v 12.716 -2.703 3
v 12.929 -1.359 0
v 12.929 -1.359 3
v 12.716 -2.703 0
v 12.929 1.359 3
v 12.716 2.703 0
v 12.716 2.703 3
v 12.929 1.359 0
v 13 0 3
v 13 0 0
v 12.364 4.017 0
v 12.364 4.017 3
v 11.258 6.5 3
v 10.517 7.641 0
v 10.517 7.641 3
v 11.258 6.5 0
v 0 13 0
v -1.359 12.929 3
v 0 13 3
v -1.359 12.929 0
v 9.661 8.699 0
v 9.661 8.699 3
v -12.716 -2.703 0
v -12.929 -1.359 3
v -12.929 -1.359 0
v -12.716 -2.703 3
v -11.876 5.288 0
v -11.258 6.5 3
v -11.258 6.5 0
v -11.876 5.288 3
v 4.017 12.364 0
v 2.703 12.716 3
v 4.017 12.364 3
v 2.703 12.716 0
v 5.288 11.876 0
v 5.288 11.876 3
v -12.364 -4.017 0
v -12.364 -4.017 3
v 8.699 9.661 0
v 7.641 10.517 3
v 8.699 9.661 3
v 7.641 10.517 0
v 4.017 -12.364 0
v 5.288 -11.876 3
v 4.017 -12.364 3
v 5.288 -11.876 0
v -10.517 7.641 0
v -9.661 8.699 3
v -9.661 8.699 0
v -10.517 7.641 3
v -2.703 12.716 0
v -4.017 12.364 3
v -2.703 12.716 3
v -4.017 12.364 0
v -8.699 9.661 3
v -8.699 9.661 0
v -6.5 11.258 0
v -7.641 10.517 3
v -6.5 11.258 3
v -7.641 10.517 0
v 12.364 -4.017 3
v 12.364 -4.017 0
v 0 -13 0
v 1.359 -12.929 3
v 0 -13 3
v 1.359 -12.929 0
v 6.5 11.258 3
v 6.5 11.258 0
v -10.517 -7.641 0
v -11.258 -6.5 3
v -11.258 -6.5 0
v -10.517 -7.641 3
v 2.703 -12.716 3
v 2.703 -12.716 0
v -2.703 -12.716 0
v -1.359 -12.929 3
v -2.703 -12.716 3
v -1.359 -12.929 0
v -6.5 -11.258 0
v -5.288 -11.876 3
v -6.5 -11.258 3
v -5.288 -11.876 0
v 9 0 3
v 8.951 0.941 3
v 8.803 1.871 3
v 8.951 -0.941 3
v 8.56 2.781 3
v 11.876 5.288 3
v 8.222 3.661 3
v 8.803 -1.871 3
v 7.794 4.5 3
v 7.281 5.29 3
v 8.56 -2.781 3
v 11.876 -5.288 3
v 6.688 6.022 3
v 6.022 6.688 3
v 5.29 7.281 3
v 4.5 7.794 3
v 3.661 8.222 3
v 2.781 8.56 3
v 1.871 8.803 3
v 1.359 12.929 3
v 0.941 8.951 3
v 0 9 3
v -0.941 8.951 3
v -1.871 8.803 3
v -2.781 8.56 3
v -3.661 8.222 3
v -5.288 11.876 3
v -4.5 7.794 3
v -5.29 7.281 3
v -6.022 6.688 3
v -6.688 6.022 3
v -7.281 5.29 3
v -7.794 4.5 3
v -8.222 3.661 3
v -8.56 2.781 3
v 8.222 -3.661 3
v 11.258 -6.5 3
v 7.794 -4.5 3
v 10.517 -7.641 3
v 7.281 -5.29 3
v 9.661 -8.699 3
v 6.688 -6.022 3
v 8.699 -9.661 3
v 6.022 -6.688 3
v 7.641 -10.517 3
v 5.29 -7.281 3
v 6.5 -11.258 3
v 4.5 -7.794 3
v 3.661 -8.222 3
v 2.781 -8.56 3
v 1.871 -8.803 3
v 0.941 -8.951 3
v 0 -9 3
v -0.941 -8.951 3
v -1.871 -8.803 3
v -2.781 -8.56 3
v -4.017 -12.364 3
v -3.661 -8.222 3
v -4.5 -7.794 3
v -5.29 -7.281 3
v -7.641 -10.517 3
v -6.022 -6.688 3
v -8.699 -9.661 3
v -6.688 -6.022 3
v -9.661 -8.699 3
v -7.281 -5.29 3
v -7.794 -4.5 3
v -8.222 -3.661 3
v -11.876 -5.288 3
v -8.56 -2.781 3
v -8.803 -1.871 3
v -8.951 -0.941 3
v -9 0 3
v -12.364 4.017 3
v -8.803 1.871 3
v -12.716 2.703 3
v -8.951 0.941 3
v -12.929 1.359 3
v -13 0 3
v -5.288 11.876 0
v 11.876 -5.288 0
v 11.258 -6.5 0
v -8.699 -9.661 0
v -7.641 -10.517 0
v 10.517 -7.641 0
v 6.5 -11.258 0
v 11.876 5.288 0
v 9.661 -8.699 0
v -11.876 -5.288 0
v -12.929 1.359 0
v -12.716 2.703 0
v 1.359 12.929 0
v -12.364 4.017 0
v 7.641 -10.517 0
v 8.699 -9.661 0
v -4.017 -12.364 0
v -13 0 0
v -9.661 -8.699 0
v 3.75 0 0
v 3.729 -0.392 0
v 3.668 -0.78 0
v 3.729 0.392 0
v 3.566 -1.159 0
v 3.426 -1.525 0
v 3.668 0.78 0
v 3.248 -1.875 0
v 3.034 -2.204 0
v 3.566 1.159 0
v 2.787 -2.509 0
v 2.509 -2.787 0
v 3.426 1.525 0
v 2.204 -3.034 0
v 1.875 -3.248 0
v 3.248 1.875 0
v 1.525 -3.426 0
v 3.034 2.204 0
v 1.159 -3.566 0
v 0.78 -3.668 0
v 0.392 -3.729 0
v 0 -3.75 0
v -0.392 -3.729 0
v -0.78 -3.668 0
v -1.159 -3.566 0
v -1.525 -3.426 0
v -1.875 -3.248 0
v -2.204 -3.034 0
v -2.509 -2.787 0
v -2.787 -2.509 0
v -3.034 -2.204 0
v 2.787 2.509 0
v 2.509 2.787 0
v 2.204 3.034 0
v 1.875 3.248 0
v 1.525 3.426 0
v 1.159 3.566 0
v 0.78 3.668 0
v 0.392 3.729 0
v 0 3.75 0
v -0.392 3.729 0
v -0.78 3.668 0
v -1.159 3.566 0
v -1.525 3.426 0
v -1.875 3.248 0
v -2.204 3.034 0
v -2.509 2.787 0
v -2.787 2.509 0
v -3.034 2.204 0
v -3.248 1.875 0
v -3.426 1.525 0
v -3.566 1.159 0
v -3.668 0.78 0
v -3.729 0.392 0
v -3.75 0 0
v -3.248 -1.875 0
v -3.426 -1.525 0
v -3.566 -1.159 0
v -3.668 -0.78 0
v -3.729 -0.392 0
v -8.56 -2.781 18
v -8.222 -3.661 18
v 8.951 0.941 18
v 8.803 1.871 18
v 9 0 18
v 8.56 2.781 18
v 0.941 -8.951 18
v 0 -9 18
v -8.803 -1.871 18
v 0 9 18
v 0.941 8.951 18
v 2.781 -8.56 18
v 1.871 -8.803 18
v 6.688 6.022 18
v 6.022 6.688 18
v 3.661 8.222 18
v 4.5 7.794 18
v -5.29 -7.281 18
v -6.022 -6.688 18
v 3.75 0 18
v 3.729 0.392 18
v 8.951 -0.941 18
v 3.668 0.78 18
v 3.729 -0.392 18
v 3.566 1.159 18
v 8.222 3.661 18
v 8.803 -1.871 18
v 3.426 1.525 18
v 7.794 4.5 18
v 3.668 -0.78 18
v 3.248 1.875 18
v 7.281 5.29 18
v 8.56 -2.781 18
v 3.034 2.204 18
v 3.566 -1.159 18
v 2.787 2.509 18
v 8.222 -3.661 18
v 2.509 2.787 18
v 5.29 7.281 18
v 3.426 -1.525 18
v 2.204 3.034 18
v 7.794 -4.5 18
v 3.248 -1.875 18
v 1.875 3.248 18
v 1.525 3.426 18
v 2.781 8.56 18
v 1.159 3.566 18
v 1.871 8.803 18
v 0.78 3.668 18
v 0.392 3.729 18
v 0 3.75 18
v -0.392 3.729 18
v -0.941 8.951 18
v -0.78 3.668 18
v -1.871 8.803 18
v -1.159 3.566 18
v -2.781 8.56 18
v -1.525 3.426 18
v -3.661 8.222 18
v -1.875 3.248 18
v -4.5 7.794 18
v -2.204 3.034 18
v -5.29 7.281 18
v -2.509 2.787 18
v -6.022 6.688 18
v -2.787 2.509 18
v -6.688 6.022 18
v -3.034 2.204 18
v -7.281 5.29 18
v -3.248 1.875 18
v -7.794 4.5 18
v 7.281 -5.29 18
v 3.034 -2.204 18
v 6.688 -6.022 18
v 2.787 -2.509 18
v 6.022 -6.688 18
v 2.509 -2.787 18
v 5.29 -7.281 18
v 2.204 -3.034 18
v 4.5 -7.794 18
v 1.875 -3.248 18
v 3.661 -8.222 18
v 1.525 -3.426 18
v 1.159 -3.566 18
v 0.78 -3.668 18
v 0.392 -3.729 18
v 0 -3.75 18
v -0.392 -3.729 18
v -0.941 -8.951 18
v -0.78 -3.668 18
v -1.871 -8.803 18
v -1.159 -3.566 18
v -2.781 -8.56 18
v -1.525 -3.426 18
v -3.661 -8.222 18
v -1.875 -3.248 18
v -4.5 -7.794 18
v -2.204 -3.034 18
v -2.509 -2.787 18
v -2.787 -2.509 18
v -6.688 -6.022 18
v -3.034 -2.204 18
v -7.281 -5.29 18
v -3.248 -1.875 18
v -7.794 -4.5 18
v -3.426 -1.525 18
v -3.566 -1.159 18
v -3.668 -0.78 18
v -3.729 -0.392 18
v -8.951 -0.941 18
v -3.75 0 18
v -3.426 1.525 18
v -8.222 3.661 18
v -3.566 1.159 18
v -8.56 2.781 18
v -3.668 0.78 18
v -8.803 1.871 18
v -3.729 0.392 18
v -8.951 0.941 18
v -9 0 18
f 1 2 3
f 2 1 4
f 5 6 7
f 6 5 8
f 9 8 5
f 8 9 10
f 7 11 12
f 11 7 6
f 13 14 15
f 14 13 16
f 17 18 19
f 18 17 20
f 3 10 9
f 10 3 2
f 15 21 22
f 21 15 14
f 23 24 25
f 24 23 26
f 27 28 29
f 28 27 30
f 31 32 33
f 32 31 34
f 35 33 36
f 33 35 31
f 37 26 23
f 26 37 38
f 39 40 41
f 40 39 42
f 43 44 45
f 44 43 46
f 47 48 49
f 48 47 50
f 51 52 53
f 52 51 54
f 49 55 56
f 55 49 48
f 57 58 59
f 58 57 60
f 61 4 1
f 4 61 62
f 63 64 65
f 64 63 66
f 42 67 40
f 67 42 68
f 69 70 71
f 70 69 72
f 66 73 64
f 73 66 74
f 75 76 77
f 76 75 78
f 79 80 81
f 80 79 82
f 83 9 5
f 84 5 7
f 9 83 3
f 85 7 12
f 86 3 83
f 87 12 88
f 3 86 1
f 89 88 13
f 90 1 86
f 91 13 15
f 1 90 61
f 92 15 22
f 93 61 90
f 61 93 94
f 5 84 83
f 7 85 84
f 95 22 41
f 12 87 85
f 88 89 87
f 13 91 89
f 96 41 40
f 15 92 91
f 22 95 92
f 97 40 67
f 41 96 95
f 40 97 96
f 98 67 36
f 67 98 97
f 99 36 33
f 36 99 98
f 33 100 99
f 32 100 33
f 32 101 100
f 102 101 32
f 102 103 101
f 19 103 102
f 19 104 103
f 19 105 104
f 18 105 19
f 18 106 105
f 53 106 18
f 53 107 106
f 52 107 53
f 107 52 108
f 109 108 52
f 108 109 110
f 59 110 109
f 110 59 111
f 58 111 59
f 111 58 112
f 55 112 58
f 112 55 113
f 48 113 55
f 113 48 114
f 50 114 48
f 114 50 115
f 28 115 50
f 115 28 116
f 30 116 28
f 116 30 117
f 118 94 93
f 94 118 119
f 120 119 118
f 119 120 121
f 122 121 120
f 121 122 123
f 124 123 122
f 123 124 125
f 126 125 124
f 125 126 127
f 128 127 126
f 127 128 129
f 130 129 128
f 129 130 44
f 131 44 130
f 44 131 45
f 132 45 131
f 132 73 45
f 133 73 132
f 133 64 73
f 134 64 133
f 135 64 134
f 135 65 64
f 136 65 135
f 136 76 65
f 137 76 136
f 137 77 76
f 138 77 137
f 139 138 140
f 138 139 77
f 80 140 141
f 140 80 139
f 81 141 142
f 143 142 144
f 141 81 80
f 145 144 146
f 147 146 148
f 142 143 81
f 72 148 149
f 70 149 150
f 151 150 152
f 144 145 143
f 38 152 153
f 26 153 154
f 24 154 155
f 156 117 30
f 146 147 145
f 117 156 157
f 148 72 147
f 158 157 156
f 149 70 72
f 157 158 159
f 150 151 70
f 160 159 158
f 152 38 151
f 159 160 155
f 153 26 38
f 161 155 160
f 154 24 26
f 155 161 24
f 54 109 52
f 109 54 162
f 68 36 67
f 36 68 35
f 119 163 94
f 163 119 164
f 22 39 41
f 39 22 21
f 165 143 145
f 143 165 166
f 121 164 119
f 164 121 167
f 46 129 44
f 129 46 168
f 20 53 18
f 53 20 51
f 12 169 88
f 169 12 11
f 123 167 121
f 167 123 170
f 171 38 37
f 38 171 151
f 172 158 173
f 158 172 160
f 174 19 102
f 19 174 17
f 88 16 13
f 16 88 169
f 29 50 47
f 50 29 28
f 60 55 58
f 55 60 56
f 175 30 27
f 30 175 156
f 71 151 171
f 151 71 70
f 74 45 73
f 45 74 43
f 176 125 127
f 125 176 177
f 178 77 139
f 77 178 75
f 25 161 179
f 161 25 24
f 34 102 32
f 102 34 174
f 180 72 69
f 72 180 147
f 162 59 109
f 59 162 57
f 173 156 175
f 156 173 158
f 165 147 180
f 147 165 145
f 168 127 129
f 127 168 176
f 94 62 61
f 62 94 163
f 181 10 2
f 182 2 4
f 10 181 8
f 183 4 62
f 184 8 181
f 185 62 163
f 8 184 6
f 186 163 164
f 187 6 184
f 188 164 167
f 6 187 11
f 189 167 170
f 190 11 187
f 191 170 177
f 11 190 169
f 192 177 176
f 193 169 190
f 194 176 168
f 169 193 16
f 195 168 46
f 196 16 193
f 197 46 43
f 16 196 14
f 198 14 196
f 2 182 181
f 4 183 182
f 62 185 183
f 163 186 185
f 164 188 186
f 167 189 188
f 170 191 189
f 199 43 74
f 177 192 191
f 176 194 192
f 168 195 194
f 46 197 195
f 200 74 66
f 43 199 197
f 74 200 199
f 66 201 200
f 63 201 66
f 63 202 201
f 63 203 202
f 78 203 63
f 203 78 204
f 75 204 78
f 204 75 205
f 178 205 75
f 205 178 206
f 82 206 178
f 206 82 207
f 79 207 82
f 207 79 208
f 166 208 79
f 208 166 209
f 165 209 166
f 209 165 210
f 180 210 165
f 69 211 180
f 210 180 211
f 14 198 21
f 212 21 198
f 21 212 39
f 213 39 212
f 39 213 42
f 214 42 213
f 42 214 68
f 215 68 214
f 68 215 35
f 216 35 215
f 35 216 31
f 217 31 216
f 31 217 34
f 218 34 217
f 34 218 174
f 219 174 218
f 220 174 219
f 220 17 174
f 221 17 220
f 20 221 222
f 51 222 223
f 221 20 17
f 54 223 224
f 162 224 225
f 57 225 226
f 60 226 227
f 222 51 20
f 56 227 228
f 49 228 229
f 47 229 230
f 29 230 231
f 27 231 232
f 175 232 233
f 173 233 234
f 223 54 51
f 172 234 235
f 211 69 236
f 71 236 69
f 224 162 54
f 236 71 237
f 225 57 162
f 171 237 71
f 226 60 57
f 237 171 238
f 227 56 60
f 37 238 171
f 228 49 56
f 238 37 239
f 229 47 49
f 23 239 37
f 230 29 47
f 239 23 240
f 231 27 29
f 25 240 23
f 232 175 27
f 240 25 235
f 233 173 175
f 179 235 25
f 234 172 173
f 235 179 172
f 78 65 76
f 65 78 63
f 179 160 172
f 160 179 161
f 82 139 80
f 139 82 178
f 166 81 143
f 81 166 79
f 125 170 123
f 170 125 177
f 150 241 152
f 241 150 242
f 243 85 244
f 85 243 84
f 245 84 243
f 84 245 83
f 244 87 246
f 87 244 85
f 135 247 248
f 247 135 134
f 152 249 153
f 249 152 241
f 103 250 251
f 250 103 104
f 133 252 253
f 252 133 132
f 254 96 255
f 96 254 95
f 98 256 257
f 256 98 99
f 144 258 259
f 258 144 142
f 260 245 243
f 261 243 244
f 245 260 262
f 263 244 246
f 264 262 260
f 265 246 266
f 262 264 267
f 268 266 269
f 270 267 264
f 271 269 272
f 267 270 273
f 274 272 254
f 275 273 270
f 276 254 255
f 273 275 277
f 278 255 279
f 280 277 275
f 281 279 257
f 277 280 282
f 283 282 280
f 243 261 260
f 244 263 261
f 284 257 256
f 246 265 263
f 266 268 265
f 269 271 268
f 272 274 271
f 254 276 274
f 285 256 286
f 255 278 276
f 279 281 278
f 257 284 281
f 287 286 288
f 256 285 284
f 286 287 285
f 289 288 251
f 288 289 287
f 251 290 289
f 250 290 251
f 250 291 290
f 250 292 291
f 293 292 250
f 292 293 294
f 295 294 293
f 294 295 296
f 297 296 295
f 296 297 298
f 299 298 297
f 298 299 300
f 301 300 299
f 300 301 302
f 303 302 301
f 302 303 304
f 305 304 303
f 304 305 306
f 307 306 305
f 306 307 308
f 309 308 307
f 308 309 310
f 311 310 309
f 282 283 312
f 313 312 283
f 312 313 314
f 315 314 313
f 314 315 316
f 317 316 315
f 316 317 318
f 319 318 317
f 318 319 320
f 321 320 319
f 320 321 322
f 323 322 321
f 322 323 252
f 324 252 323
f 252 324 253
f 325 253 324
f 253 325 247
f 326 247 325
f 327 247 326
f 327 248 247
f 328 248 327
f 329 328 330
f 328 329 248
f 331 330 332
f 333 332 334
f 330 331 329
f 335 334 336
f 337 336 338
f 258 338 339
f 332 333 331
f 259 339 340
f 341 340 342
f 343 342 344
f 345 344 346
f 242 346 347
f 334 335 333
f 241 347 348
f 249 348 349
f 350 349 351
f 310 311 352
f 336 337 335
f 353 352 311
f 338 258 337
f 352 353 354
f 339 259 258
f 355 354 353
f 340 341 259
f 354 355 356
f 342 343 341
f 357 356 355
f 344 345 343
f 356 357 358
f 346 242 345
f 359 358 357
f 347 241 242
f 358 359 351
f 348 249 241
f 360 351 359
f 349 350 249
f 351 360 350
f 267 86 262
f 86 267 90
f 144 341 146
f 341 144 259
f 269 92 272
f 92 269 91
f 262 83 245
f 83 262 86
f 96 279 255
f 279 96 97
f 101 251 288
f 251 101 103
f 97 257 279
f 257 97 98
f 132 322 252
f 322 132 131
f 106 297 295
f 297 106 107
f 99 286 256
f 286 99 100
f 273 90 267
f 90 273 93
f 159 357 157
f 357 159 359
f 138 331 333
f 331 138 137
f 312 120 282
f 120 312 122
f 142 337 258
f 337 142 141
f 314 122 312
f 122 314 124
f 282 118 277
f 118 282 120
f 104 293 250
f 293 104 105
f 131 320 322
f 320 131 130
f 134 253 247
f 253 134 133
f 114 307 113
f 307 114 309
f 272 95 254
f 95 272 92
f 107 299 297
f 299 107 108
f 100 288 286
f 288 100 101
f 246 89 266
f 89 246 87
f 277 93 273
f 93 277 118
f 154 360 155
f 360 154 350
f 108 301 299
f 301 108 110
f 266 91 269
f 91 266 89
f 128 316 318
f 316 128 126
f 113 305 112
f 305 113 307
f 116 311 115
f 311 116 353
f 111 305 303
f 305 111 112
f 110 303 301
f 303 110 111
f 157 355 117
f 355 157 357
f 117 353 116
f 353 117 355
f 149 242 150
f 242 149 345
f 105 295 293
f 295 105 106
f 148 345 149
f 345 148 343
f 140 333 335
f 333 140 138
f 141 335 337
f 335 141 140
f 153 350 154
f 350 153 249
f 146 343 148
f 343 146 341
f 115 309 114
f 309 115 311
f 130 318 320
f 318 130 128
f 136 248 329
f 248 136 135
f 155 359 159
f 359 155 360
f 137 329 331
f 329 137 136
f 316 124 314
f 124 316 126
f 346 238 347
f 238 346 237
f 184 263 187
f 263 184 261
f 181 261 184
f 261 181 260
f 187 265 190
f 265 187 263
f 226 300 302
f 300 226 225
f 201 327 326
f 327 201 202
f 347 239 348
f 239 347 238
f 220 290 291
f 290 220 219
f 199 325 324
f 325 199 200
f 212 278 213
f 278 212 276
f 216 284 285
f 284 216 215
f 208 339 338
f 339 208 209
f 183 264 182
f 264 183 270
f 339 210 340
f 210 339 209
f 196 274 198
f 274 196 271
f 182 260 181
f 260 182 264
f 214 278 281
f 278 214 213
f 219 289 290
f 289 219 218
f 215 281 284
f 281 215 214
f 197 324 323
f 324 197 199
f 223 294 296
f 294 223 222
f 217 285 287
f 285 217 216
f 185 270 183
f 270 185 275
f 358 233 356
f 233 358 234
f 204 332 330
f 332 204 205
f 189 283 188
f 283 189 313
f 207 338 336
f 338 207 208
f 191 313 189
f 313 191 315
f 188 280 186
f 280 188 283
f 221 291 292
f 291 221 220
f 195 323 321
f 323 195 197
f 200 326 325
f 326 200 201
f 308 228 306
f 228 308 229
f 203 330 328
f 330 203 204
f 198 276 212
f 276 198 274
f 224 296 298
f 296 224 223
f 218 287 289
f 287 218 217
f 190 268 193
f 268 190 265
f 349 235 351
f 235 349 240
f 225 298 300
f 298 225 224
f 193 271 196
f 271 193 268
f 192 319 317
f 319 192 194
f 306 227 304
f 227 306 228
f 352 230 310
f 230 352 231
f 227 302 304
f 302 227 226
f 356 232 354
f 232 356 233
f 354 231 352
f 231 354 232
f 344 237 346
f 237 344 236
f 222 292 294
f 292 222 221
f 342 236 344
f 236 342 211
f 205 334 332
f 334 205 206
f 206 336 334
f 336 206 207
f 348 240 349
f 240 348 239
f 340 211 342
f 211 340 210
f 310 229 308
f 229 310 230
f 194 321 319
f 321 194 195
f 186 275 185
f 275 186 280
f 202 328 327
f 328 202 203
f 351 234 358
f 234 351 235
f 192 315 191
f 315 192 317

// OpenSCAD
// Cable gland body for 7 mm cable.
$fn = 60;
eps = 0.02;
cable_d = 7;
body_d = 18;
body_l = 18;
flange_d = body_d + 8;
flange_t = 3;
difference() {
    union() { cylinder(d = flange_d, h = flange_t); cylinder(d = body_d, h = body_l); }
    translate([0, 0, -eps]) cylinder(d = cable_d + 0.5, h = body_l + 2 * eps);
}
